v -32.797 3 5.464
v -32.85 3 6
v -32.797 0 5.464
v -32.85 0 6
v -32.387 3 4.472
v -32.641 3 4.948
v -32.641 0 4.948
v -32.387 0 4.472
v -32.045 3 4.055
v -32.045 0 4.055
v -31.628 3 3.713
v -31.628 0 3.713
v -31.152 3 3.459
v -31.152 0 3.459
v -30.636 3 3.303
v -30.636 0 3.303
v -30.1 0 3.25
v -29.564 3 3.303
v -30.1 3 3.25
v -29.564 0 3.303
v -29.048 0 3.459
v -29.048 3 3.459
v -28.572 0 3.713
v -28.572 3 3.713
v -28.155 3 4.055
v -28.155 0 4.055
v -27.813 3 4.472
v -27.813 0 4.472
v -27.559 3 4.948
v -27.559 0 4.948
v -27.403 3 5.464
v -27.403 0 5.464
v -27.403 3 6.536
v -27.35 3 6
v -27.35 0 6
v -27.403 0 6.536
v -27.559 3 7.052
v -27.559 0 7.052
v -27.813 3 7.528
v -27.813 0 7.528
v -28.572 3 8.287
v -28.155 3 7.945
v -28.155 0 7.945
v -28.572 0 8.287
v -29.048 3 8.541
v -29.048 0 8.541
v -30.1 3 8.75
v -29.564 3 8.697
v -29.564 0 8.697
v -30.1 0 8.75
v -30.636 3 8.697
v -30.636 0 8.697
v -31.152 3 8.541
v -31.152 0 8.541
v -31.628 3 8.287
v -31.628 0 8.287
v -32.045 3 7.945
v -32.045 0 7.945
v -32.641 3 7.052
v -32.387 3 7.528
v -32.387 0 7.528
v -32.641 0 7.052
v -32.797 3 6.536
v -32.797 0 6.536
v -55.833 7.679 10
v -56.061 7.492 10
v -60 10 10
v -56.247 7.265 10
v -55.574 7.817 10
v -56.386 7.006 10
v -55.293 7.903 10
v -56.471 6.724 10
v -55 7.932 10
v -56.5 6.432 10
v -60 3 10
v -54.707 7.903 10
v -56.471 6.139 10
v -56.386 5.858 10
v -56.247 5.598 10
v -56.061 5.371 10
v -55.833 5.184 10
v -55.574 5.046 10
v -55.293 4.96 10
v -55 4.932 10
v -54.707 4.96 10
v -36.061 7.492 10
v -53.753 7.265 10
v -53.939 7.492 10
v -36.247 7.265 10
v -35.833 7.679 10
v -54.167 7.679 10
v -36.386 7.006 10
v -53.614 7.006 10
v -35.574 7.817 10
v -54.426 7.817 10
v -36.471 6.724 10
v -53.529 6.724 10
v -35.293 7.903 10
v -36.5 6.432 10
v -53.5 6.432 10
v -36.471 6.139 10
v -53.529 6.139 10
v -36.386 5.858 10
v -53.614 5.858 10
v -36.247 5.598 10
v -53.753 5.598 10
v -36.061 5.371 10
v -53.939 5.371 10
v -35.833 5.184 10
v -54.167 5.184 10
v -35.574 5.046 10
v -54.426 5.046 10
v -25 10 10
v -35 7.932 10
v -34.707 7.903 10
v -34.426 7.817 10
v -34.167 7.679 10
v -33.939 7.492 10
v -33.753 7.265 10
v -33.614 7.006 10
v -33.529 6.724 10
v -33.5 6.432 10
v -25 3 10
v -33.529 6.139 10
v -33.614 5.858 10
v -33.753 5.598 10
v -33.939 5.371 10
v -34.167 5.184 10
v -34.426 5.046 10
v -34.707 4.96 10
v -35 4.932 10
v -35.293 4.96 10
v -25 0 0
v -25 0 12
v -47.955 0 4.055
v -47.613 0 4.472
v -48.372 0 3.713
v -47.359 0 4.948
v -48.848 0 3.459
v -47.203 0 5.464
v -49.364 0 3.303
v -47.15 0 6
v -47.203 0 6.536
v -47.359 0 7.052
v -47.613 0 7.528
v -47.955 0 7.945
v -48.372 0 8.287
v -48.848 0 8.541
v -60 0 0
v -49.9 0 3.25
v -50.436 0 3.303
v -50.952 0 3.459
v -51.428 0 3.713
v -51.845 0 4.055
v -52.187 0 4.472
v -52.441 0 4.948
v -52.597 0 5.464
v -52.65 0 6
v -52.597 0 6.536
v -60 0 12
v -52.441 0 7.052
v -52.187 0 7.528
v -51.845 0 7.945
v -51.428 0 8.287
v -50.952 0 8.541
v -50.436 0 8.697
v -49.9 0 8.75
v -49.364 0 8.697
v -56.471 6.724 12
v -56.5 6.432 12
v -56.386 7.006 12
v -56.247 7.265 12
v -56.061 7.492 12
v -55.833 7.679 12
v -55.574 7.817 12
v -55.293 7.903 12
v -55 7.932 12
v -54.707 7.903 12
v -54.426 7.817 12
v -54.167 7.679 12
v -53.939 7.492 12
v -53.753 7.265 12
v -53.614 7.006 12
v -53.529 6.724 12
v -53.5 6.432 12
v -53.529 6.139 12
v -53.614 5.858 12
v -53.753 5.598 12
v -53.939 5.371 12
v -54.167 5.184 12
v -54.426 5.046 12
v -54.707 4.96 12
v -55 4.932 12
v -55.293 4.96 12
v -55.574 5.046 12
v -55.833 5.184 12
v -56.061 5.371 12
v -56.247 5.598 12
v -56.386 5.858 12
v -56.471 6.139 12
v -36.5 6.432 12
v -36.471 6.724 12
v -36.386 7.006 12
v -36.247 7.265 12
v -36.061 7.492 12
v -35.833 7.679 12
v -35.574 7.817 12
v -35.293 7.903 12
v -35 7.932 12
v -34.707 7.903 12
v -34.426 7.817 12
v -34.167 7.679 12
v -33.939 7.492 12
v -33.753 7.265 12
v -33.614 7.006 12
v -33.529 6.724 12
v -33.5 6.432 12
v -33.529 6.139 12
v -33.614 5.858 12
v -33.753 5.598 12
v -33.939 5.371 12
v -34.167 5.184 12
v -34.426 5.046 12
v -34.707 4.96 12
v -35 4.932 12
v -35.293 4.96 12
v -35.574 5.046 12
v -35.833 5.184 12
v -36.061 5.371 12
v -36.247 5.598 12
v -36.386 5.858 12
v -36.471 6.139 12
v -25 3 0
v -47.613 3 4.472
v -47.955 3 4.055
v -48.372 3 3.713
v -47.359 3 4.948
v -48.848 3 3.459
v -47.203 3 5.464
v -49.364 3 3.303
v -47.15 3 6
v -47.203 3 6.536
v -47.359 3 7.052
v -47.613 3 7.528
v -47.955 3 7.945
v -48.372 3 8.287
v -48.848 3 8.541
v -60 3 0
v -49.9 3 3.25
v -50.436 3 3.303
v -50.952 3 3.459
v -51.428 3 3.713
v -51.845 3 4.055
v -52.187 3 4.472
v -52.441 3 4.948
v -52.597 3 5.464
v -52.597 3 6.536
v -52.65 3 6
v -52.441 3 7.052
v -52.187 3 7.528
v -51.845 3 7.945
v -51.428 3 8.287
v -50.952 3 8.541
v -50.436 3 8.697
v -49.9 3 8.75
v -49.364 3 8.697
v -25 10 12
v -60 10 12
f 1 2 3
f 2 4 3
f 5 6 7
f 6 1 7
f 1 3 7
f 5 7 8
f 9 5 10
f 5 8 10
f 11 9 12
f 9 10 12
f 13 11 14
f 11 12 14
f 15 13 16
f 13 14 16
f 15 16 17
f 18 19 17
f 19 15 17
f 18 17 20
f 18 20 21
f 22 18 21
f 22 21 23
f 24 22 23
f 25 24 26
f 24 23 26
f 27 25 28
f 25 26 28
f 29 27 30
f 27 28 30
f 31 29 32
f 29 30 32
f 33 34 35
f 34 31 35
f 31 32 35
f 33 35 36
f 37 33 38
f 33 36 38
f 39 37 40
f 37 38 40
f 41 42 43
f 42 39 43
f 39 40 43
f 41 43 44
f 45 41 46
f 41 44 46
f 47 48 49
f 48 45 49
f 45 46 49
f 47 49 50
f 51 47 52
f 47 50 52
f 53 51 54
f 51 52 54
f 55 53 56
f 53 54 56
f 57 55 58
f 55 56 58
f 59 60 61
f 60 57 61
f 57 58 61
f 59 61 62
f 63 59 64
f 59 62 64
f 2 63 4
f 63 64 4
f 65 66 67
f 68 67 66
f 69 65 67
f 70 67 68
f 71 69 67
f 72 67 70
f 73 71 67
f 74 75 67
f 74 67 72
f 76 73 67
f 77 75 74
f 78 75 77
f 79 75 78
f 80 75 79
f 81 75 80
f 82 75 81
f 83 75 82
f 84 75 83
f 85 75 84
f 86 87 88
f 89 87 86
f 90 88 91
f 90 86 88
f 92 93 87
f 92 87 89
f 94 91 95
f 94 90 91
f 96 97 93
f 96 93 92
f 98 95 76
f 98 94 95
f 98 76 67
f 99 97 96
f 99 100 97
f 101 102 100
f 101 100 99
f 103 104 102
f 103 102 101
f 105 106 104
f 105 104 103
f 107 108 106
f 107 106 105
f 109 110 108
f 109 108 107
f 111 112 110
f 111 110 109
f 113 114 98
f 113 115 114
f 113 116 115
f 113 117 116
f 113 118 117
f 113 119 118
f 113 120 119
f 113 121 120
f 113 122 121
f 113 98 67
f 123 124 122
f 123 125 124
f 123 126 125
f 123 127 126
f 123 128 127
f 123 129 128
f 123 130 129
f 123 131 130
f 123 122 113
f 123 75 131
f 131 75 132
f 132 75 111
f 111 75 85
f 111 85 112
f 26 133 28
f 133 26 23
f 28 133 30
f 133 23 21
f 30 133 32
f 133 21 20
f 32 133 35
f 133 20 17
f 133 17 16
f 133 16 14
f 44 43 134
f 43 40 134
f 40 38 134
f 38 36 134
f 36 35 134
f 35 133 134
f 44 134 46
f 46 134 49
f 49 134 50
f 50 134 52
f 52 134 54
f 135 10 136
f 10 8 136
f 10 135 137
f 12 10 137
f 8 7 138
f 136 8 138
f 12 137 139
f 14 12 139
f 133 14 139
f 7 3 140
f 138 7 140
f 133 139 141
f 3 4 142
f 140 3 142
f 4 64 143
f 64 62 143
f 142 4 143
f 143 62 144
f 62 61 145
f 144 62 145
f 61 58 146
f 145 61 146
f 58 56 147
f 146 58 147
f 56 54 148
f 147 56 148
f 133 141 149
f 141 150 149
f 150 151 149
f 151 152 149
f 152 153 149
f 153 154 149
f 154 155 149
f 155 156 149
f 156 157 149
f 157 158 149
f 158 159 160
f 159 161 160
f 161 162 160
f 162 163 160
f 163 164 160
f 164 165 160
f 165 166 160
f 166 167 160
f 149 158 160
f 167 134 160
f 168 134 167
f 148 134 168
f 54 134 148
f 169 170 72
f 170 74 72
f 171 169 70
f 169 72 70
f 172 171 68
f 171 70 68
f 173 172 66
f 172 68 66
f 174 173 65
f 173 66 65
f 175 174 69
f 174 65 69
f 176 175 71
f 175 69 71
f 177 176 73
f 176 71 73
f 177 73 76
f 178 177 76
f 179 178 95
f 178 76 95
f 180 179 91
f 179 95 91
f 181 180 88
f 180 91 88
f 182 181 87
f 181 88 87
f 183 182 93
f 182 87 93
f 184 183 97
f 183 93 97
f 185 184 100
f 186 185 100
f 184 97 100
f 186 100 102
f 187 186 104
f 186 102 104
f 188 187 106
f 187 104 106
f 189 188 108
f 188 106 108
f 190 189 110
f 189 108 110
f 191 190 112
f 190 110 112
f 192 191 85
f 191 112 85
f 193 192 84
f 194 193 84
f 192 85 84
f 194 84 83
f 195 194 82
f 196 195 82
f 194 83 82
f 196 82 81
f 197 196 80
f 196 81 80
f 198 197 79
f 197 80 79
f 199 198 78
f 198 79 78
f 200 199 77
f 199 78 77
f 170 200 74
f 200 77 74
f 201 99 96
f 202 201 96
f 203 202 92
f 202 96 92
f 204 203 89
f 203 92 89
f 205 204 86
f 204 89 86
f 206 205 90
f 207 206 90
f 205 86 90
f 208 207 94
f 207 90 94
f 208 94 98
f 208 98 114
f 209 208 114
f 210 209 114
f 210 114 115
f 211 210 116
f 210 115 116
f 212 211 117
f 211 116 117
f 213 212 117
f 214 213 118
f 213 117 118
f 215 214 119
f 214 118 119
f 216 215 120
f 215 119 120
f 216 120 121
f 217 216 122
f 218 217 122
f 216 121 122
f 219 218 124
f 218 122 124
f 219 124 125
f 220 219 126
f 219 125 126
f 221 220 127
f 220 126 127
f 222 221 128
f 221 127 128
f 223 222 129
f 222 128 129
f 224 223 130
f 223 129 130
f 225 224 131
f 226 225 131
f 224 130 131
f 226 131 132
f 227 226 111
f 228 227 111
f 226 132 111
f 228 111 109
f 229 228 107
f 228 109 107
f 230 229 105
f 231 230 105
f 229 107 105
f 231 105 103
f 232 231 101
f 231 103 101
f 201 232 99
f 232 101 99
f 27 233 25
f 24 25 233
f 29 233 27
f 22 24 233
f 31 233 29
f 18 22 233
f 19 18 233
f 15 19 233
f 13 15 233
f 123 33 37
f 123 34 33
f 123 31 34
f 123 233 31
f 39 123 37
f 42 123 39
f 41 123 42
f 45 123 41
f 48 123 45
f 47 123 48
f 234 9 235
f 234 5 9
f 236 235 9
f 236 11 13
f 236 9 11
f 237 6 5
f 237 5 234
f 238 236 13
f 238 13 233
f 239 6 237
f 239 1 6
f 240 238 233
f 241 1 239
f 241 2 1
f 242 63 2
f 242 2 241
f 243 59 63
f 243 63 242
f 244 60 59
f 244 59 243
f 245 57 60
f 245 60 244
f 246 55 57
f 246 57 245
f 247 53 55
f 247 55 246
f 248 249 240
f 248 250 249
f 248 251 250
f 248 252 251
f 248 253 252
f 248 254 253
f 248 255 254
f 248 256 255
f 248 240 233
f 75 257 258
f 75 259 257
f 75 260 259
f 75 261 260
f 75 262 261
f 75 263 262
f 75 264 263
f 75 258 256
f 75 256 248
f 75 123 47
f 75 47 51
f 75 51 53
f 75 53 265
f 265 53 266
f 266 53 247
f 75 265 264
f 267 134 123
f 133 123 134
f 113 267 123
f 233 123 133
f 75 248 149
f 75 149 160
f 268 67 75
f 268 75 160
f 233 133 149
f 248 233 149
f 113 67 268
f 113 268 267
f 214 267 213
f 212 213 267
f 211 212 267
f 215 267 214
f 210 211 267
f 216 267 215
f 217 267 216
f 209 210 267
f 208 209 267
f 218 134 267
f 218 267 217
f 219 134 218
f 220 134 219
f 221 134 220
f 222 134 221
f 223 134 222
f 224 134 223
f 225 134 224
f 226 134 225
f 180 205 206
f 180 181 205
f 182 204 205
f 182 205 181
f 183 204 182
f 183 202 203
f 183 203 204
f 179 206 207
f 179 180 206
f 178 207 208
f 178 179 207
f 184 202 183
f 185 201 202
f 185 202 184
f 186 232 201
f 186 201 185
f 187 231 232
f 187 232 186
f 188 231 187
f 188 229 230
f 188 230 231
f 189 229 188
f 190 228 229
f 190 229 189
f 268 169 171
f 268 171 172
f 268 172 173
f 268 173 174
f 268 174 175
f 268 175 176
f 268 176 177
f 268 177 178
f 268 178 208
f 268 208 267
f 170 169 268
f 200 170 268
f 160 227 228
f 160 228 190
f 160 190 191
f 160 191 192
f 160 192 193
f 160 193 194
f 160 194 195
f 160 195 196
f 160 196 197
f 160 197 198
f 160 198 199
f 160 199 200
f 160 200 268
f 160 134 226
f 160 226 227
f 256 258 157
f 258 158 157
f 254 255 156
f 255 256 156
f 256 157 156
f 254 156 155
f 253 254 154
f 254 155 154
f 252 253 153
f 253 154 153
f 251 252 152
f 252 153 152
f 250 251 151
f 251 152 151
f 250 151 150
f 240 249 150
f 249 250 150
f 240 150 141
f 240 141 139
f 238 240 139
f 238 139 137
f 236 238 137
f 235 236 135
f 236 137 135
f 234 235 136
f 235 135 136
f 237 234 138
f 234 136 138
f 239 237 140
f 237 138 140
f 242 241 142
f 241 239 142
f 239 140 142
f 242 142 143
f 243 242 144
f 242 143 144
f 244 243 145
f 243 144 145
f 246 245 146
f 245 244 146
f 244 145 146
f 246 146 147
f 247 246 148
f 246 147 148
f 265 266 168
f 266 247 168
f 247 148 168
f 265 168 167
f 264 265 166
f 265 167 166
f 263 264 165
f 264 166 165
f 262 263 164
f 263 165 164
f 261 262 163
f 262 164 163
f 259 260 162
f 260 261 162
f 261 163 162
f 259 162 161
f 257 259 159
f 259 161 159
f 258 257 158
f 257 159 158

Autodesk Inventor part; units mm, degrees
ref_plane "YZ Plane" through (0, 0, 0) normal (1, 0, 0) x (0, 1, 0)
ref_plane "XZ Plane" through (0, 0, 0) normal (0, 1, 0) x (-1, 0, 0)
ref_plane "XY Plane" through (0, 0, 0) normal (0, 0, 1) x (1, 0, 0)
sketch "Sketch1" plane through (0, 0, 0) normal (0, 1, 0) x (-1, 0, 0)
  circle A0 centre (30.1, 6) radius 2.1
  circle A1 centre (49.9, 6) radius 2.1
  line L0 (0, 0) -> (80, 0)
  line L1 (80, 0) -> (80, 12)
  line L2 (0, 12) -> (80, 12)
  line L3 (0, 0) -> (0, 12)
  line L4 (40, 12) -> (15, 12)
  line L5 (15, 12) -> (15, 0)
  line L6 (15, 0) -> (65, 0)
  line L7 (65, 0) -> (65, 12)
  circle A2 centre (49.9, 6) radius 2.75
  circle A3 centre (30.1, 6) radius 2.75
  dimension "d0" = 25
  dimension "d1" = 50
  dimension "d2" = 5.5
  dimension "d3" = 5.5
extrude "Extrusion1" add sketch "Sketch1" along normal blind 3 contours L5 L2 L7 L0
sketch "Sketch2" plane through (0, 3, 0) normal (0, 1, 0) x (1, 0, 0)
  line L0 (-15, -12) -> (-15, 0) projected
  line L1 (-65, 0) -> (-65, -12) projected
  line L2 (-15, -12) -> (-65, -12)
  line L3 (-65, -12) -> (-65, -9.9998)
  line L4 (-65, -9.9998) -> (-15, -9.9998)
  line L5 (-15, -9.9998) -> (-15, -12)
  point P0 (0, 0)
extrude "Extrusion2" add sketch "Sketch2" along normal blind 7
sketch "Sketch3" plane through (-15, 3, 9.9998) normal (0, 0, -1) x (-1, 0, 0)
  line L0 (0, -3) -> (0, 7) projected
  line L1 (0, -0.0684) -> (30, -0.0684)
  line L2 (0, -0.0684) -> (30, -0.0684) construction
  line L3 (30, -0.0684) -> (30, 3.4316)
  line L4 (30, 3.4316) -> (40, 3.4316)
  line L5 (40, 3.4316) -> (20, 3.4316)
  circle A0 centre (20, 3.4316) radius 1.5
  circle A1 centre (40, 3.4316) radius 1.5
  point P0 (-15, -3)
  dimension "d8" = 30
  dimension "d9" = 0
  dimension "d10" = 3.5
  dimension "d11" = 10
  dimension "d12" = 20
  dimension "d13" = 3
  dimension "d14" = 3
extrude "Extrusion3" cut sketch "Sketch3" against normal blind 10
sketch "Sketch4" plane through (-15, 0, 12) normal (1, 0, 0) x (0, 0, -1)
  line L0 (0, 0) -> (12, 0) projected
  line L1 (12, 0) -> (12, 3) projected
  line L2 (2.0002, 3) -> (12, 3) projected
  line L3 (2.0002, 3) -> (2.0002, 10) projected
  line L4 (0, 10) -> (2.0002, 10) projected
  line L5 (0, 0) -> (0, 10) projected
extrude "Extrusion4" cut sketch "Sketch4" against normal blind 10
sketch "Sketch5" plane through (-65, 0, 0) normal (-1, 0, 0) x (0, 0, 1)
  line L0 (8.75, 3) -> (8.75, 0) projected
  line L1 (0, 0) -> (12, 0) projected
  line L2 (12, 0) -> (12, 10) projected
  line L3 (9.9998, 10) -> (12, 10) projected
  line L4 (9.9998, 3) -> (9.9998, 10) projected
  line L5 (0, 3) -> (9.9998, 3) projected
  line L6 (0, 0) -> (0, 3) projected
extrude "Extrusion5" cut sketch "Sketch5" against normal blind 5
properties part number "end_button"
